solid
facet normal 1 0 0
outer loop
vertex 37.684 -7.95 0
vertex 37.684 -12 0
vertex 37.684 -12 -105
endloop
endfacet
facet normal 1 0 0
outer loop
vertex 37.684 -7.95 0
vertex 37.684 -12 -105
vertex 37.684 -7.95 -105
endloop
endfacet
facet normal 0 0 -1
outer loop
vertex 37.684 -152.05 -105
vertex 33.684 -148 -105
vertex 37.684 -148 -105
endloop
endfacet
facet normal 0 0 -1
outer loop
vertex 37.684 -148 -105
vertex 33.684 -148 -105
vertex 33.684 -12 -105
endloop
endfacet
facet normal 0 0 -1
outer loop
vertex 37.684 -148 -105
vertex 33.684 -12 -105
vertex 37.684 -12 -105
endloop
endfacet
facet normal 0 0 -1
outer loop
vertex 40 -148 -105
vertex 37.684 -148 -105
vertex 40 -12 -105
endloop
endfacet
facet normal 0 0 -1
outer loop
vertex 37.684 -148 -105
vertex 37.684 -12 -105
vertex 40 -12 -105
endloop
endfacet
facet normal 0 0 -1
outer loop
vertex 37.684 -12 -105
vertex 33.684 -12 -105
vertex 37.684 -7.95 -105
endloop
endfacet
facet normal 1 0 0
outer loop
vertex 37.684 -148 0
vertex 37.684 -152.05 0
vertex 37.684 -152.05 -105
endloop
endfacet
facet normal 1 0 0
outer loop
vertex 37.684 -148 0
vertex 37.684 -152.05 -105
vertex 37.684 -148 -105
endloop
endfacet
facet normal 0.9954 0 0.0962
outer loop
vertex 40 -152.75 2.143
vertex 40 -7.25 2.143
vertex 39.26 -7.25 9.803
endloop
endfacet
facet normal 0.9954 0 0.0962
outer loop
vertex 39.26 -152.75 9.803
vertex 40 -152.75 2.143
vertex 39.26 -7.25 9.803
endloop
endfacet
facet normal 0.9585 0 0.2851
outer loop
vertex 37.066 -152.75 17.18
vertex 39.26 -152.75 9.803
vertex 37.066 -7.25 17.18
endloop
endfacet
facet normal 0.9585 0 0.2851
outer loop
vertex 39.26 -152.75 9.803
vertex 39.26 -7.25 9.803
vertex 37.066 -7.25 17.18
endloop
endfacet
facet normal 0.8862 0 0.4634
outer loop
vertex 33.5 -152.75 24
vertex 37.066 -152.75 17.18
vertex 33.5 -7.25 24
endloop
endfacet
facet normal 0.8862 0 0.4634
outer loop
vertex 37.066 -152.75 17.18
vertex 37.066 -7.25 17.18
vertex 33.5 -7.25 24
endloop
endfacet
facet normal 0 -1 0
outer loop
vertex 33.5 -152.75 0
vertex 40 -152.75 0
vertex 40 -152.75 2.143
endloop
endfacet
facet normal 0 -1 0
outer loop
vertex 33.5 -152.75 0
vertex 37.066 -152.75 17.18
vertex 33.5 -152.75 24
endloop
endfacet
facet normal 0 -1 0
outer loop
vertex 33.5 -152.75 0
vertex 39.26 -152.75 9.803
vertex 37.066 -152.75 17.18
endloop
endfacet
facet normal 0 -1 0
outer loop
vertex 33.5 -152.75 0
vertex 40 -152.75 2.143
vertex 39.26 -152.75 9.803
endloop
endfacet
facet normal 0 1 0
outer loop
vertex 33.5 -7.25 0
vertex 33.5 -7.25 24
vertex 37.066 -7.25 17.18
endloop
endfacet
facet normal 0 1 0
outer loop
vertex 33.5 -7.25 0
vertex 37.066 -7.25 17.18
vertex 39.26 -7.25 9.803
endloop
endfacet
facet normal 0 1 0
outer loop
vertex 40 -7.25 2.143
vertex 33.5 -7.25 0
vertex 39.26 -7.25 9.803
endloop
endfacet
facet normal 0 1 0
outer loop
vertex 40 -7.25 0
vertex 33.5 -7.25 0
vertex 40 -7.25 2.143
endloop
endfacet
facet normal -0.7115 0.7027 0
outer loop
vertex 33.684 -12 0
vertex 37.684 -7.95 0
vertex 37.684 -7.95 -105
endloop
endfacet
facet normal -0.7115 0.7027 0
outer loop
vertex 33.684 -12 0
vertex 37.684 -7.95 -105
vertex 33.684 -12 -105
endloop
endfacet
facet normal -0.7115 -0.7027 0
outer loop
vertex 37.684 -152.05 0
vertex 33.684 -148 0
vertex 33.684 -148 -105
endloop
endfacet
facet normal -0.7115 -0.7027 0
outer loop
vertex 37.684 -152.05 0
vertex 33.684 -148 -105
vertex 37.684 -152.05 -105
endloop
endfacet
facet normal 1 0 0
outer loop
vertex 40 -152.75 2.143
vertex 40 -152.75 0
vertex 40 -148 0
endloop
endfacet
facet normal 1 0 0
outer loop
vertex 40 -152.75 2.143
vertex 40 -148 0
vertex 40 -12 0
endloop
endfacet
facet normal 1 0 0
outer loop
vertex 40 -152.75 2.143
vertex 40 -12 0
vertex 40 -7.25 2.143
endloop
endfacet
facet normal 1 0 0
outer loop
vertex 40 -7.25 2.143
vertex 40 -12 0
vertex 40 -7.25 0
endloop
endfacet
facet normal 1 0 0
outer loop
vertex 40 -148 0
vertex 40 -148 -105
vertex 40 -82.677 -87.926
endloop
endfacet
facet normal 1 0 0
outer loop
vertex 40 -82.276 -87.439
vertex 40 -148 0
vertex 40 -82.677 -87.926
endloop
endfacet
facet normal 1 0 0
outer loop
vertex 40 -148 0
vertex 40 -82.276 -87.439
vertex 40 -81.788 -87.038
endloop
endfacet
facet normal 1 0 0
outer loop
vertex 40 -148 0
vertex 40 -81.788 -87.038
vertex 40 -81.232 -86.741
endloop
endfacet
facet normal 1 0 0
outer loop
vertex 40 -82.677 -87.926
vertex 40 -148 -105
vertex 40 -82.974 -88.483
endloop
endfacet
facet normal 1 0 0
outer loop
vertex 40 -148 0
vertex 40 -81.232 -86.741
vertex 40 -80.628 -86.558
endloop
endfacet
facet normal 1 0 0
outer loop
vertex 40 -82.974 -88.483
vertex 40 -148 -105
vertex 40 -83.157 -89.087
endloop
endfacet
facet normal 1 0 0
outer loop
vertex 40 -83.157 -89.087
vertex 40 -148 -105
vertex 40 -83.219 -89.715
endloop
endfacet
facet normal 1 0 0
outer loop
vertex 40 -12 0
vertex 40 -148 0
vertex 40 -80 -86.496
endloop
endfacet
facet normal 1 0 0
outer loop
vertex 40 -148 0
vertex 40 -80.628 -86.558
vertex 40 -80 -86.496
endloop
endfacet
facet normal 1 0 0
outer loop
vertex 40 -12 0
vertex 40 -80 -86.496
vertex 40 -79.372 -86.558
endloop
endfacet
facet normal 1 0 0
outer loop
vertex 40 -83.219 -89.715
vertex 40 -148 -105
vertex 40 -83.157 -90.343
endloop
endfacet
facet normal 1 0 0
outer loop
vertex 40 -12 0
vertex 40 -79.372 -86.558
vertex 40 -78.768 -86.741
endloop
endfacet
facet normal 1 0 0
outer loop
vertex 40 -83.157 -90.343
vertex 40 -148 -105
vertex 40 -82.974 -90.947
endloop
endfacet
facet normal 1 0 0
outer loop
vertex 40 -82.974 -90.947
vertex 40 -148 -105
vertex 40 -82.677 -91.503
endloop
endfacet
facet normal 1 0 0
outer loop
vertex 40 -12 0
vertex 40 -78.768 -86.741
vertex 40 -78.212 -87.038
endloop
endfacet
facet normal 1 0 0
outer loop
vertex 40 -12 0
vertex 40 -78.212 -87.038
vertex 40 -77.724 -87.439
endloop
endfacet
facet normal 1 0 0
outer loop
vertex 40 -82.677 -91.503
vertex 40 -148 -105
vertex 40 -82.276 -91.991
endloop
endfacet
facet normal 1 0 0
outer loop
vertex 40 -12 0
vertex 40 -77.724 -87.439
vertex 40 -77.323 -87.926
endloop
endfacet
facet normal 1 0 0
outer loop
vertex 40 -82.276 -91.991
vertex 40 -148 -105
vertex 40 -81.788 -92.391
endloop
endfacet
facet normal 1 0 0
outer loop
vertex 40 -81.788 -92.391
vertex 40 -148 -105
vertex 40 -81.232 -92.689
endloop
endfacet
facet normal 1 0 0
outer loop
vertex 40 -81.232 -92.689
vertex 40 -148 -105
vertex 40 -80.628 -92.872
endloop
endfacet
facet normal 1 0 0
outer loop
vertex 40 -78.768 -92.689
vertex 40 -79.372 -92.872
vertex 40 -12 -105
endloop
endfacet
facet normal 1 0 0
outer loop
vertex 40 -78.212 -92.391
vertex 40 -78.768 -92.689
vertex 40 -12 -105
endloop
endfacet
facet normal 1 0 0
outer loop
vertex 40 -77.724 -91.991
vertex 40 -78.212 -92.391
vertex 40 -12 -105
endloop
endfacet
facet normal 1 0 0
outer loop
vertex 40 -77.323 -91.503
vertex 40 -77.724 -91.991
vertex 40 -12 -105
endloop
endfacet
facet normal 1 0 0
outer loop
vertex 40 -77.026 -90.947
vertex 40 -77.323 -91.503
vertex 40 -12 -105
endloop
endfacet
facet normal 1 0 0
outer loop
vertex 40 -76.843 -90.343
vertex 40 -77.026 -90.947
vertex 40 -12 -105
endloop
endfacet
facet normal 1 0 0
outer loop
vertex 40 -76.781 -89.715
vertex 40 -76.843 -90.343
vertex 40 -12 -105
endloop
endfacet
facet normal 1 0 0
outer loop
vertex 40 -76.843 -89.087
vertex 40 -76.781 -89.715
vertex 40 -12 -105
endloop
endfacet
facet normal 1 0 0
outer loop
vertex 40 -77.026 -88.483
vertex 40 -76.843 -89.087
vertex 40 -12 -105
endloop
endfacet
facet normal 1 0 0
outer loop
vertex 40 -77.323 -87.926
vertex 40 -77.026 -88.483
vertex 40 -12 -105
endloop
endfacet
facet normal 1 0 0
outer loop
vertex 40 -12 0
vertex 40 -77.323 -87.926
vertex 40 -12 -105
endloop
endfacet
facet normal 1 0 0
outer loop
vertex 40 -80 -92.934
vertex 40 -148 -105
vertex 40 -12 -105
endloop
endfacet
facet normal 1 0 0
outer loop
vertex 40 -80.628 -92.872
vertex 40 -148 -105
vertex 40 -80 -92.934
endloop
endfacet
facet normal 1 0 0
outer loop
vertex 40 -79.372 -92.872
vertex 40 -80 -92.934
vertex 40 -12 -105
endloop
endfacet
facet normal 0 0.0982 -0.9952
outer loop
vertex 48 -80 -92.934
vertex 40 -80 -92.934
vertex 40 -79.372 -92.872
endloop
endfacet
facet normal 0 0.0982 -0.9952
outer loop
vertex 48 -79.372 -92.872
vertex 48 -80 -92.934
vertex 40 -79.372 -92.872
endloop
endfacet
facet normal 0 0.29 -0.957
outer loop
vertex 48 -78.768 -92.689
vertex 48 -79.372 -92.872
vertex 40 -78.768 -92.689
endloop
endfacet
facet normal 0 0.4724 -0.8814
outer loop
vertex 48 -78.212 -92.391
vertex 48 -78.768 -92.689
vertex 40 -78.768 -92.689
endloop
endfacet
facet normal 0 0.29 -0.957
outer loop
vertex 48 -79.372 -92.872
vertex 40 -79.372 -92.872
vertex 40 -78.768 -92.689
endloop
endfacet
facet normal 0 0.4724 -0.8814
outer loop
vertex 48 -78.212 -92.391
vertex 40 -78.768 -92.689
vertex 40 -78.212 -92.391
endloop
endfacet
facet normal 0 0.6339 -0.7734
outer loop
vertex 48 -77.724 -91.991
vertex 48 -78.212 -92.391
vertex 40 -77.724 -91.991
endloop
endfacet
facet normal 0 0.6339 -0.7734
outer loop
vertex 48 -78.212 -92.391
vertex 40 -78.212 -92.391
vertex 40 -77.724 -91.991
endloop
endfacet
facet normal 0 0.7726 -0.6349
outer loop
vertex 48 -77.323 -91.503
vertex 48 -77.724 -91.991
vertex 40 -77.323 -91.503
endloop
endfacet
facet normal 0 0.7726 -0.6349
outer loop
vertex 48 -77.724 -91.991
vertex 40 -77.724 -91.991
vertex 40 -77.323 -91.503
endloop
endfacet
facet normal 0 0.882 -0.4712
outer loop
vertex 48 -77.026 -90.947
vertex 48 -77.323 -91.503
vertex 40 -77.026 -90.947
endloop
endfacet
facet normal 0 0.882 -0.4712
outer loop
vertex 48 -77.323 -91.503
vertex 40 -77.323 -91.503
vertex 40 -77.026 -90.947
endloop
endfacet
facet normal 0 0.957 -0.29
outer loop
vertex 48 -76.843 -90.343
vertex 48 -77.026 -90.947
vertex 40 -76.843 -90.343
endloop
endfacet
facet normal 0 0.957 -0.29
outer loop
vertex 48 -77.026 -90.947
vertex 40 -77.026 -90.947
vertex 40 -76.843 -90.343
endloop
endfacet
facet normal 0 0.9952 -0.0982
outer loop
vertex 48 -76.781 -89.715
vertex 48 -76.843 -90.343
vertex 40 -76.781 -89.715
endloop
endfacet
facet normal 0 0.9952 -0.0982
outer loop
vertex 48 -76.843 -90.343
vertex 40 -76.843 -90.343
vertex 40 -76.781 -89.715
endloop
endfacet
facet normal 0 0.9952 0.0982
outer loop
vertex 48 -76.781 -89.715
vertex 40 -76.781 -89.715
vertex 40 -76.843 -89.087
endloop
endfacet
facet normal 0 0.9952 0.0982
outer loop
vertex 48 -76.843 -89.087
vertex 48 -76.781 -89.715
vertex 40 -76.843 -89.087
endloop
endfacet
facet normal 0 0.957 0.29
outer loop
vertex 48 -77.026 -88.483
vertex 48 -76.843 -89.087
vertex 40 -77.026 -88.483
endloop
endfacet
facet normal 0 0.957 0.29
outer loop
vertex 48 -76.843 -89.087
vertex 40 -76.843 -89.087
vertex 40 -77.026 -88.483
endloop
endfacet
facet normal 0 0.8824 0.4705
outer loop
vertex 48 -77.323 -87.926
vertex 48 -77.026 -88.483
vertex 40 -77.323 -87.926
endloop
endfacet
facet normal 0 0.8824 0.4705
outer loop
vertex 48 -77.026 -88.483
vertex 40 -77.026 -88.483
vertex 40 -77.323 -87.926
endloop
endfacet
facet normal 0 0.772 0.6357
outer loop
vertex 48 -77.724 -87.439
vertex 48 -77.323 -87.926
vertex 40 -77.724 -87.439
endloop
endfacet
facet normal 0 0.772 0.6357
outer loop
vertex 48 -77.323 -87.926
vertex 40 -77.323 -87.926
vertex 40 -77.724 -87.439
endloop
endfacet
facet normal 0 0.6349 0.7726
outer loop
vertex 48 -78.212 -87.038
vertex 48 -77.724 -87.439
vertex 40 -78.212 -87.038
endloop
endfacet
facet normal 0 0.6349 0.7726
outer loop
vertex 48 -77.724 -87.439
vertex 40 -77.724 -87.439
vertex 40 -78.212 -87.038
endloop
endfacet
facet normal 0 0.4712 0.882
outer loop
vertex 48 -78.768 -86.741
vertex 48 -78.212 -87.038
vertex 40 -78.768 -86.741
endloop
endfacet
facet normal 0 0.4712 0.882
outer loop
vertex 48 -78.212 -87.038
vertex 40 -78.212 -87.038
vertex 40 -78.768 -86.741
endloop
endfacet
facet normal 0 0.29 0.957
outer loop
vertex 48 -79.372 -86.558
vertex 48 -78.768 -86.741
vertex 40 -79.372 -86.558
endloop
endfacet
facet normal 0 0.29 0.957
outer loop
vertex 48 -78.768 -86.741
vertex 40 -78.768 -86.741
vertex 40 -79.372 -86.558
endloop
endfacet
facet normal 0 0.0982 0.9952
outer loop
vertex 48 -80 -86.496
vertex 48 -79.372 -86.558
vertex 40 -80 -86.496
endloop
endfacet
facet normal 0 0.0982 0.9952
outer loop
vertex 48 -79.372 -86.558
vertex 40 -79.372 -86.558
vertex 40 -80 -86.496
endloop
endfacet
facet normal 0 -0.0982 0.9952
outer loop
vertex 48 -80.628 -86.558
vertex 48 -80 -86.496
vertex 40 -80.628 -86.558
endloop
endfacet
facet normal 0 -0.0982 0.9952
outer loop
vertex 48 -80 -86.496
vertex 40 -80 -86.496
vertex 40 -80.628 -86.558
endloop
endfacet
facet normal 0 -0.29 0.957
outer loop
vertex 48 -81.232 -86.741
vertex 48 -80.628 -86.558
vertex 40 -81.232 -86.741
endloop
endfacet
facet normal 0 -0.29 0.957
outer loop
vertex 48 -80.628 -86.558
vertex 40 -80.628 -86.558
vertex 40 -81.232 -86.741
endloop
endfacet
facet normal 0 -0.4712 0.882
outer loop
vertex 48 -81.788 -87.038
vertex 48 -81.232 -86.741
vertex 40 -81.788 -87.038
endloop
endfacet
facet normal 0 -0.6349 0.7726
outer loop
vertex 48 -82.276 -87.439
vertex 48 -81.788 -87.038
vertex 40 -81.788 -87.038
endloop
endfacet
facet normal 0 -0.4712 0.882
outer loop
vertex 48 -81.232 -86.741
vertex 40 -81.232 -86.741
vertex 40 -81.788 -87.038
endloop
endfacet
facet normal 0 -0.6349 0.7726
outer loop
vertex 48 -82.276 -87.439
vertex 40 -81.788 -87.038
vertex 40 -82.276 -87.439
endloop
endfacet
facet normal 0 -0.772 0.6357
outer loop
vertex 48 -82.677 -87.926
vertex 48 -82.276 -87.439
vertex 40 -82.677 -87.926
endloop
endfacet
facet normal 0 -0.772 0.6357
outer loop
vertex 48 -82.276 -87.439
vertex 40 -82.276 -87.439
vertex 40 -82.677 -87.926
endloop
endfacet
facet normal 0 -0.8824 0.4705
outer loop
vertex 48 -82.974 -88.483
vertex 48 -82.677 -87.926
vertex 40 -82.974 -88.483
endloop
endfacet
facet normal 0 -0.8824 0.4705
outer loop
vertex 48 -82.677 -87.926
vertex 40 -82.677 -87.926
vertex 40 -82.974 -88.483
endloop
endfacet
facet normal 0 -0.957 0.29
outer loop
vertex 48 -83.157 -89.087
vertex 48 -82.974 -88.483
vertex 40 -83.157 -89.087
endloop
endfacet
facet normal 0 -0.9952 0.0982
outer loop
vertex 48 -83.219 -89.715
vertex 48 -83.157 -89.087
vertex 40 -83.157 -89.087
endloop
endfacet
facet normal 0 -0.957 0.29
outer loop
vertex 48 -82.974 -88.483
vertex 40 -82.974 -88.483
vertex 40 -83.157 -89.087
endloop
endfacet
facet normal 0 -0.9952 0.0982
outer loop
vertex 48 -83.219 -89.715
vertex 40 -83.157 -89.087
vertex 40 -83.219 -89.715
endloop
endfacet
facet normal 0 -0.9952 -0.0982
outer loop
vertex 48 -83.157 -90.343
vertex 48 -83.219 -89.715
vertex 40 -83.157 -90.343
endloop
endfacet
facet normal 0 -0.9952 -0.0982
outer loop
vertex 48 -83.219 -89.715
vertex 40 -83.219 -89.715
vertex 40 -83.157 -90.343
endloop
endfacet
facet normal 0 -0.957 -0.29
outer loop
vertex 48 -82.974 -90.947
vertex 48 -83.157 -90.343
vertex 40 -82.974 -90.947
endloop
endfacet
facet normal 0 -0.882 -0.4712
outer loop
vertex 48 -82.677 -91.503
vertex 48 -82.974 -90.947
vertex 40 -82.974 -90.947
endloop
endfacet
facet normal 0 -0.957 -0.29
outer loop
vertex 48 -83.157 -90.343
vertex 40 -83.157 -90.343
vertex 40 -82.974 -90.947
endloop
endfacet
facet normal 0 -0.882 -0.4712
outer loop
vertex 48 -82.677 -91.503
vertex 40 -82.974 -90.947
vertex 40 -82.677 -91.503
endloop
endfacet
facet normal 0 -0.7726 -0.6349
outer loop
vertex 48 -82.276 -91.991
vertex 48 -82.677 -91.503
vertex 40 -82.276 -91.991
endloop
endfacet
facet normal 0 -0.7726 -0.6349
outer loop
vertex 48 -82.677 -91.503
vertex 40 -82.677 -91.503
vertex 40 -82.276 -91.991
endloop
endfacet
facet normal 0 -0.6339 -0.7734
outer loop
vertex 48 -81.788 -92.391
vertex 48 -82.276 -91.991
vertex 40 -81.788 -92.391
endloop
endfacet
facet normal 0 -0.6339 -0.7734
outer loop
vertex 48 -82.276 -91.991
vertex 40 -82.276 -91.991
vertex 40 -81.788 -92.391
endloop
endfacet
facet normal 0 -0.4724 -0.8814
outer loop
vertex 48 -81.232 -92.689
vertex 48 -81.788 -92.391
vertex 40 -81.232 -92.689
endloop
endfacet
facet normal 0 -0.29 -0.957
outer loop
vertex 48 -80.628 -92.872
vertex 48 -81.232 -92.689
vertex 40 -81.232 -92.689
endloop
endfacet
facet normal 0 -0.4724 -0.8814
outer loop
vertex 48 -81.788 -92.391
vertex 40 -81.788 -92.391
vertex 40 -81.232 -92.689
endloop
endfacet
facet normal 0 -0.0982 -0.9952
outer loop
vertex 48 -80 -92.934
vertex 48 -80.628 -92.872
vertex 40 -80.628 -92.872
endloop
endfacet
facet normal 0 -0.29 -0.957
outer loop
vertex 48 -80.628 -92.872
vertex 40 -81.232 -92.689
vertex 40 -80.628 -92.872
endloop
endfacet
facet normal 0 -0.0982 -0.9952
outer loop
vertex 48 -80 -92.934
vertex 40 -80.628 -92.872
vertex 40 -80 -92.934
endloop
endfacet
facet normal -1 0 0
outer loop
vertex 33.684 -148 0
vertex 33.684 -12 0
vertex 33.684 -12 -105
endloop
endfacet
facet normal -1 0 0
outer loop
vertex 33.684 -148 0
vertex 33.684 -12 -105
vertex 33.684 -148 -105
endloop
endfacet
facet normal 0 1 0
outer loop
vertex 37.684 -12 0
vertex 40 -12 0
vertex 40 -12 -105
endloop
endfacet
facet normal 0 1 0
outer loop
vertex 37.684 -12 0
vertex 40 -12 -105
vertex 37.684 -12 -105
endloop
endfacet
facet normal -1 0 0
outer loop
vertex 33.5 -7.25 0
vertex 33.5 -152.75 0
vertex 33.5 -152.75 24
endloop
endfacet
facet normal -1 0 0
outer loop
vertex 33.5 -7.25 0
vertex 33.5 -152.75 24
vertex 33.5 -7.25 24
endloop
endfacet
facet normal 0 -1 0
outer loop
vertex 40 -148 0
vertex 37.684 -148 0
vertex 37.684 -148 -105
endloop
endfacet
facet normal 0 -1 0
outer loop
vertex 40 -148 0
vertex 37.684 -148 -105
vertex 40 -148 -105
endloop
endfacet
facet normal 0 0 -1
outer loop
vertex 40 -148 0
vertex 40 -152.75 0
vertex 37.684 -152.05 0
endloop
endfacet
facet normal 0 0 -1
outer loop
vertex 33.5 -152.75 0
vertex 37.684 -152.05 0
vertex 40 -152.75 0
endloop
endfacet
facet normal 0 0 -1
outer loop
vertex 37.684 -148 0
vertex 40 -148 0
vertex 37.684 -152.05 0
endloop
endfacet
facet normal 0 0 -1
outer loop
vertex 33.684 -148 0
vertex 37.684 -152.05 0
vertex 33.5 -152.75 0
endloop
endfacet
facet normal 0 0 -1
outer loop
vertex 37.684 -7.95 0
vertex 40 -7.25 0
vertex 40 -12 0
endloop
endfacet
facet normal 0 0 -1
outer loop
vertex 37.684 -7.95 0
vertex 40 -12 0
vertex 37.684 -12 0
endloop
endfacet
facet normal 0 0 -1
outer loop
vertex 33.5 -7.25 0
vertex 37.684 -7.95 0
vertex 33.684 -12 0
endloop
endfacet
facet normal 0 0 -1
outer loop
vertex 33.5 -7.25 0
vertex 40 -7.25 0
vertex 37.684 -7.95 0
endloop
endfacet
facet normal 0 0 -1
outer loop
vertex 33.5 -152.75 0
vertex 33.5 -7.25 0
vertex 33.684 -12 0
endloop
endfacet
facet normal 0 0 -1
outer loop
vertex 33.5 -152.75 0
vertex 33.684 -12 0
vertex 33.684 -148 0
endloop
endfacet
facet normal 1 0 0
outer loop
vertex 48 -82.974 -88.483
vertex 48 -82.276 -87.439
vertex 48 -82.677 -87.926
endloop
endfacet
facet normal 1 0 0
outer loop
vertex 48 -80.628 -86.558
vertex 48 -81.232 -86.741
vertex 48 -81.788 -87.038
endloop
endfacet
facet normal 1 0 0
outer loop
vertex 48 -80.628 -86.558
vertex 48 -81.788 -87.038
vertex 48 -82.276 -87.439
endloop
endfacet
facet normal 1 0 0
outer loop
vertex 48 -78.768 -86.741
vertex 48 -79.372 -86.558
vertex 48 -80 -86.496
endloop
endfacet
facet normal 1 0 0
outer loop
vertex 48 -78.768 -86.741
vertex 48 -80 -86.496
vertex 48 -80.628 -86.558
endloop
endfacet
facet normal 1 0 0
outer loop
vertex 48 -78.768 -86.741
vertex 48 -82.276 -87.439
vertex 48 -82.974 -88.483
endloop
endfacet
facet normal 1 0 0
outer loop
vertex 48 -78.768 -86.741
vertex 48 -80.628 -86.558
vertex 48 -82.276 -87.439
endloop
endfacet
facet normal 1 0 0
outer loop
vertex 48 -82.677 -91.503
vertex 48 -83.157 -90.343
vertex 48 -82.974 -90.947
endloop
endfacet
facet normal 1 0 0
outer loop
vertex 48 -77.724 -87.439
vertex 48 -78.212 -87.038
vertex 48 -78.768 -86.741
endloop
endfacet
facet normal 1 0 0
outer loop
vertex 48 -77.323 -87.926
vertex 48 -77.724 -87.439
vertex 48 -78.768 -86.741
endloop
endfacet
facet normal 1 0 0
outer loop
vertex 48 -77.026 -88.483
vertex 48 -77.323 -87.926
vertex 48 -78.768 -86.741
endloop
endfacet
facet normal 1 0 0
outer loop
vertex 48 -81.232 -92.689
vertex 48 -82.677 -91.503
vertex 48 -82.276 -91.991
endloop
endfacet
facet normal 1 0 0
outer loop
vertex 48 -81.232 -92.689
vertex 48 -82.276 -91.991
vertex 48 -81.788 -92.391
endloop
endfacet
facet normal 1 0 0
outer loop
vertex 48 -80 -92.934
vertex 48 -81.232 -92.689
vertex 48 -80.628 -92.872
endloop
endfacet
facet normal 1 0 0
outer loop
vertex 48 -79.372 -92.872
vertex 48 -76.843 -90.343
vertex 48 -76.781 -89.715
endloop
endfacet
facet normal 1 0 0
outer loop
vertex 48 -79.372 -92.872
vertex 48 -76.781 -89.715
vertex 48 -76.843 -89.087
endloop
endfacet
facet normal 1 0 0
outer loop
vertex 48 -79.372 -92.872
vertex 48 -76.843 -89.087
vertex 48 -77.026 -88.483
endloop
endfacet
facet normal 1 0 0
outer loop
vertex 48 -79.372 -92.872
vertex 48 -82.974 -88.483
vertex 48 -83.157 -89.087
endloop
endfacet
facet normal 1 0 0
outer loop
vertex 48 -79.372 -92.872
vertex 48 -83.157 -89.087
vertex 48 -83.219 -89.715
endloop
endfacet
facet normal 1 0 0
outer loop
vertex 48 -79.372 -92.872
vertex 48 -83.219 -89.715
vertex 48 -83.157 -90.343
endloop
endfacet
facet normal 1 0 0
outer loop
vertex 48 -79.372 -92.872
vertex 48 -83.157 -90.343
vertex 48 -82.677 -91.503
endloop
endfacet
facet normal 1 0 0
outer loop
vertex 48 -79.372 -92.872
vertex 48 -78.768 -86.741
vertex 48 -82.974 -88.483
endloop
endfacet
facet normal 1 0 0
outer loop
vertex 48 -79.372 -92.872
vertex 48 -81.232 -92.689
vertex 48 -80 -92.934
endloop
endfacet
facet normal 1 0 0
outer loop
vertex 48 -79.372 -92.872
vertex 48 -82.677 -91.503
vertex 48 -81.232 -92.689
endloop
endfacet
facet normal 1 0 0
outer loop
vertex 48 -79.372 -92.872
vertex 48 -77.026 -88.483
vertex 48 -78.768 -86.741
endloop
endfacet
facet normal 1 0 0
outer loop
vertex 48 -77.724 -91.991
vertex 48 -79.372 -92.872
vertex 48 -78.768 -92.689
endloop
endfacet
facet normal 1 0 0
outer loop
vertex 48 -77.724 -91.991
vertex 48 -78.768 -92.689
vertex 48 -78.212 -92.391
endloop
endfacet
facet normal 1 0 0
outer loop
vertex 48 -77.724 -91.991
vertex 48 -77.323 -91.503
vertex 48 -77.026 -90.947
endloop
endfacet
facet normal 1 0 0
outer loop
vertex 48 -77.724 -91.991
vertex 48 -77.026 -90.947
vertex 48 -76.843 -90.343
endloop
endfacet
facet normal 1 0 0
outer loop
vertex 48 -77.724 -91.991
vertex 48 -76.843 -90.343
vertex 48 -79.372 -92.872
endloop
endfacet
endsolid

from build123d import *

# Parameters (mm, degrees)
BOSS_EXTRUDE1_DEPTH = 105
BOSS_EXTRUDE2_DEPTH = 24
FILLET1_R           = 40
SKETCH5_R           = 3.219097994
BOSS_EXTRUDE3_DEPTH = 8


with BuildPart() as part:
    # Sketch1 → Boss-Extrude1 (new body)
    with BuildSketch(Plane.XY):
        Polygon((37.684072543, -12), (37.684072543, -7.95), (33.684072543, -12), (33.684072543, -148), (37.684072543, -152.05), (37.684072543, -148), (40, -148), (40, -12), align=None)
    extrude(amount=-BOSS_EXTRUDE1_DEPTH)

    # Sketch4 → Boss-Extrude2 (add)
    with BuildSketch(Plane.XY):
        Polygon((40, -152.75), (33.5, -152.75), (33.5, -7.25), (40, -7.25), (40, -80), align=None)
    extrude(amount=BOSS_EXTRUDE2_DEPTH)

    # Fillet1
    # the kernel refuses this fillet: 40 mm, written as the material it takes off along each edge
    with BuildSketch(Plane(origin=(40, 47.393732486, 24), x_dir=(0, 0, -1), z_dir=(0, -1, 0))) as fillet1_piece_1:
        with BuildLine():
            CenterArc((21.857492994, -40), FILLET1_R, 90, 33.122940208)
            Line((0, -6.5), (-0.43714986, -5.83))
            ThreePointArc((-0.43714986, -5.83), (-0.8, -3.25), (-0.8, 0))
            Line((-0.8, 0), (0, 0.8))
            Line((0, 0.8), (21.857492994, 0.8))
            Line((21.857492994, 0.8), (21.857492994, 0))
        make_face()
    extrude(amount=254.787464972, mode=Mode.SUBTRACT)

    # Sketch5 → Boss-Extrude3 (add)
    with BuildSketch(Plane(origin=(40, 0, 0), x_dir=(0, 0, -1), z_dir=(1, 0, 0))):
        with Locations((89.714756259, -80)):
            Circle(SKETCH5_R)
    extrude(amount=BOSS_EXTRUDE3_DEPTH)


solid = part.part
